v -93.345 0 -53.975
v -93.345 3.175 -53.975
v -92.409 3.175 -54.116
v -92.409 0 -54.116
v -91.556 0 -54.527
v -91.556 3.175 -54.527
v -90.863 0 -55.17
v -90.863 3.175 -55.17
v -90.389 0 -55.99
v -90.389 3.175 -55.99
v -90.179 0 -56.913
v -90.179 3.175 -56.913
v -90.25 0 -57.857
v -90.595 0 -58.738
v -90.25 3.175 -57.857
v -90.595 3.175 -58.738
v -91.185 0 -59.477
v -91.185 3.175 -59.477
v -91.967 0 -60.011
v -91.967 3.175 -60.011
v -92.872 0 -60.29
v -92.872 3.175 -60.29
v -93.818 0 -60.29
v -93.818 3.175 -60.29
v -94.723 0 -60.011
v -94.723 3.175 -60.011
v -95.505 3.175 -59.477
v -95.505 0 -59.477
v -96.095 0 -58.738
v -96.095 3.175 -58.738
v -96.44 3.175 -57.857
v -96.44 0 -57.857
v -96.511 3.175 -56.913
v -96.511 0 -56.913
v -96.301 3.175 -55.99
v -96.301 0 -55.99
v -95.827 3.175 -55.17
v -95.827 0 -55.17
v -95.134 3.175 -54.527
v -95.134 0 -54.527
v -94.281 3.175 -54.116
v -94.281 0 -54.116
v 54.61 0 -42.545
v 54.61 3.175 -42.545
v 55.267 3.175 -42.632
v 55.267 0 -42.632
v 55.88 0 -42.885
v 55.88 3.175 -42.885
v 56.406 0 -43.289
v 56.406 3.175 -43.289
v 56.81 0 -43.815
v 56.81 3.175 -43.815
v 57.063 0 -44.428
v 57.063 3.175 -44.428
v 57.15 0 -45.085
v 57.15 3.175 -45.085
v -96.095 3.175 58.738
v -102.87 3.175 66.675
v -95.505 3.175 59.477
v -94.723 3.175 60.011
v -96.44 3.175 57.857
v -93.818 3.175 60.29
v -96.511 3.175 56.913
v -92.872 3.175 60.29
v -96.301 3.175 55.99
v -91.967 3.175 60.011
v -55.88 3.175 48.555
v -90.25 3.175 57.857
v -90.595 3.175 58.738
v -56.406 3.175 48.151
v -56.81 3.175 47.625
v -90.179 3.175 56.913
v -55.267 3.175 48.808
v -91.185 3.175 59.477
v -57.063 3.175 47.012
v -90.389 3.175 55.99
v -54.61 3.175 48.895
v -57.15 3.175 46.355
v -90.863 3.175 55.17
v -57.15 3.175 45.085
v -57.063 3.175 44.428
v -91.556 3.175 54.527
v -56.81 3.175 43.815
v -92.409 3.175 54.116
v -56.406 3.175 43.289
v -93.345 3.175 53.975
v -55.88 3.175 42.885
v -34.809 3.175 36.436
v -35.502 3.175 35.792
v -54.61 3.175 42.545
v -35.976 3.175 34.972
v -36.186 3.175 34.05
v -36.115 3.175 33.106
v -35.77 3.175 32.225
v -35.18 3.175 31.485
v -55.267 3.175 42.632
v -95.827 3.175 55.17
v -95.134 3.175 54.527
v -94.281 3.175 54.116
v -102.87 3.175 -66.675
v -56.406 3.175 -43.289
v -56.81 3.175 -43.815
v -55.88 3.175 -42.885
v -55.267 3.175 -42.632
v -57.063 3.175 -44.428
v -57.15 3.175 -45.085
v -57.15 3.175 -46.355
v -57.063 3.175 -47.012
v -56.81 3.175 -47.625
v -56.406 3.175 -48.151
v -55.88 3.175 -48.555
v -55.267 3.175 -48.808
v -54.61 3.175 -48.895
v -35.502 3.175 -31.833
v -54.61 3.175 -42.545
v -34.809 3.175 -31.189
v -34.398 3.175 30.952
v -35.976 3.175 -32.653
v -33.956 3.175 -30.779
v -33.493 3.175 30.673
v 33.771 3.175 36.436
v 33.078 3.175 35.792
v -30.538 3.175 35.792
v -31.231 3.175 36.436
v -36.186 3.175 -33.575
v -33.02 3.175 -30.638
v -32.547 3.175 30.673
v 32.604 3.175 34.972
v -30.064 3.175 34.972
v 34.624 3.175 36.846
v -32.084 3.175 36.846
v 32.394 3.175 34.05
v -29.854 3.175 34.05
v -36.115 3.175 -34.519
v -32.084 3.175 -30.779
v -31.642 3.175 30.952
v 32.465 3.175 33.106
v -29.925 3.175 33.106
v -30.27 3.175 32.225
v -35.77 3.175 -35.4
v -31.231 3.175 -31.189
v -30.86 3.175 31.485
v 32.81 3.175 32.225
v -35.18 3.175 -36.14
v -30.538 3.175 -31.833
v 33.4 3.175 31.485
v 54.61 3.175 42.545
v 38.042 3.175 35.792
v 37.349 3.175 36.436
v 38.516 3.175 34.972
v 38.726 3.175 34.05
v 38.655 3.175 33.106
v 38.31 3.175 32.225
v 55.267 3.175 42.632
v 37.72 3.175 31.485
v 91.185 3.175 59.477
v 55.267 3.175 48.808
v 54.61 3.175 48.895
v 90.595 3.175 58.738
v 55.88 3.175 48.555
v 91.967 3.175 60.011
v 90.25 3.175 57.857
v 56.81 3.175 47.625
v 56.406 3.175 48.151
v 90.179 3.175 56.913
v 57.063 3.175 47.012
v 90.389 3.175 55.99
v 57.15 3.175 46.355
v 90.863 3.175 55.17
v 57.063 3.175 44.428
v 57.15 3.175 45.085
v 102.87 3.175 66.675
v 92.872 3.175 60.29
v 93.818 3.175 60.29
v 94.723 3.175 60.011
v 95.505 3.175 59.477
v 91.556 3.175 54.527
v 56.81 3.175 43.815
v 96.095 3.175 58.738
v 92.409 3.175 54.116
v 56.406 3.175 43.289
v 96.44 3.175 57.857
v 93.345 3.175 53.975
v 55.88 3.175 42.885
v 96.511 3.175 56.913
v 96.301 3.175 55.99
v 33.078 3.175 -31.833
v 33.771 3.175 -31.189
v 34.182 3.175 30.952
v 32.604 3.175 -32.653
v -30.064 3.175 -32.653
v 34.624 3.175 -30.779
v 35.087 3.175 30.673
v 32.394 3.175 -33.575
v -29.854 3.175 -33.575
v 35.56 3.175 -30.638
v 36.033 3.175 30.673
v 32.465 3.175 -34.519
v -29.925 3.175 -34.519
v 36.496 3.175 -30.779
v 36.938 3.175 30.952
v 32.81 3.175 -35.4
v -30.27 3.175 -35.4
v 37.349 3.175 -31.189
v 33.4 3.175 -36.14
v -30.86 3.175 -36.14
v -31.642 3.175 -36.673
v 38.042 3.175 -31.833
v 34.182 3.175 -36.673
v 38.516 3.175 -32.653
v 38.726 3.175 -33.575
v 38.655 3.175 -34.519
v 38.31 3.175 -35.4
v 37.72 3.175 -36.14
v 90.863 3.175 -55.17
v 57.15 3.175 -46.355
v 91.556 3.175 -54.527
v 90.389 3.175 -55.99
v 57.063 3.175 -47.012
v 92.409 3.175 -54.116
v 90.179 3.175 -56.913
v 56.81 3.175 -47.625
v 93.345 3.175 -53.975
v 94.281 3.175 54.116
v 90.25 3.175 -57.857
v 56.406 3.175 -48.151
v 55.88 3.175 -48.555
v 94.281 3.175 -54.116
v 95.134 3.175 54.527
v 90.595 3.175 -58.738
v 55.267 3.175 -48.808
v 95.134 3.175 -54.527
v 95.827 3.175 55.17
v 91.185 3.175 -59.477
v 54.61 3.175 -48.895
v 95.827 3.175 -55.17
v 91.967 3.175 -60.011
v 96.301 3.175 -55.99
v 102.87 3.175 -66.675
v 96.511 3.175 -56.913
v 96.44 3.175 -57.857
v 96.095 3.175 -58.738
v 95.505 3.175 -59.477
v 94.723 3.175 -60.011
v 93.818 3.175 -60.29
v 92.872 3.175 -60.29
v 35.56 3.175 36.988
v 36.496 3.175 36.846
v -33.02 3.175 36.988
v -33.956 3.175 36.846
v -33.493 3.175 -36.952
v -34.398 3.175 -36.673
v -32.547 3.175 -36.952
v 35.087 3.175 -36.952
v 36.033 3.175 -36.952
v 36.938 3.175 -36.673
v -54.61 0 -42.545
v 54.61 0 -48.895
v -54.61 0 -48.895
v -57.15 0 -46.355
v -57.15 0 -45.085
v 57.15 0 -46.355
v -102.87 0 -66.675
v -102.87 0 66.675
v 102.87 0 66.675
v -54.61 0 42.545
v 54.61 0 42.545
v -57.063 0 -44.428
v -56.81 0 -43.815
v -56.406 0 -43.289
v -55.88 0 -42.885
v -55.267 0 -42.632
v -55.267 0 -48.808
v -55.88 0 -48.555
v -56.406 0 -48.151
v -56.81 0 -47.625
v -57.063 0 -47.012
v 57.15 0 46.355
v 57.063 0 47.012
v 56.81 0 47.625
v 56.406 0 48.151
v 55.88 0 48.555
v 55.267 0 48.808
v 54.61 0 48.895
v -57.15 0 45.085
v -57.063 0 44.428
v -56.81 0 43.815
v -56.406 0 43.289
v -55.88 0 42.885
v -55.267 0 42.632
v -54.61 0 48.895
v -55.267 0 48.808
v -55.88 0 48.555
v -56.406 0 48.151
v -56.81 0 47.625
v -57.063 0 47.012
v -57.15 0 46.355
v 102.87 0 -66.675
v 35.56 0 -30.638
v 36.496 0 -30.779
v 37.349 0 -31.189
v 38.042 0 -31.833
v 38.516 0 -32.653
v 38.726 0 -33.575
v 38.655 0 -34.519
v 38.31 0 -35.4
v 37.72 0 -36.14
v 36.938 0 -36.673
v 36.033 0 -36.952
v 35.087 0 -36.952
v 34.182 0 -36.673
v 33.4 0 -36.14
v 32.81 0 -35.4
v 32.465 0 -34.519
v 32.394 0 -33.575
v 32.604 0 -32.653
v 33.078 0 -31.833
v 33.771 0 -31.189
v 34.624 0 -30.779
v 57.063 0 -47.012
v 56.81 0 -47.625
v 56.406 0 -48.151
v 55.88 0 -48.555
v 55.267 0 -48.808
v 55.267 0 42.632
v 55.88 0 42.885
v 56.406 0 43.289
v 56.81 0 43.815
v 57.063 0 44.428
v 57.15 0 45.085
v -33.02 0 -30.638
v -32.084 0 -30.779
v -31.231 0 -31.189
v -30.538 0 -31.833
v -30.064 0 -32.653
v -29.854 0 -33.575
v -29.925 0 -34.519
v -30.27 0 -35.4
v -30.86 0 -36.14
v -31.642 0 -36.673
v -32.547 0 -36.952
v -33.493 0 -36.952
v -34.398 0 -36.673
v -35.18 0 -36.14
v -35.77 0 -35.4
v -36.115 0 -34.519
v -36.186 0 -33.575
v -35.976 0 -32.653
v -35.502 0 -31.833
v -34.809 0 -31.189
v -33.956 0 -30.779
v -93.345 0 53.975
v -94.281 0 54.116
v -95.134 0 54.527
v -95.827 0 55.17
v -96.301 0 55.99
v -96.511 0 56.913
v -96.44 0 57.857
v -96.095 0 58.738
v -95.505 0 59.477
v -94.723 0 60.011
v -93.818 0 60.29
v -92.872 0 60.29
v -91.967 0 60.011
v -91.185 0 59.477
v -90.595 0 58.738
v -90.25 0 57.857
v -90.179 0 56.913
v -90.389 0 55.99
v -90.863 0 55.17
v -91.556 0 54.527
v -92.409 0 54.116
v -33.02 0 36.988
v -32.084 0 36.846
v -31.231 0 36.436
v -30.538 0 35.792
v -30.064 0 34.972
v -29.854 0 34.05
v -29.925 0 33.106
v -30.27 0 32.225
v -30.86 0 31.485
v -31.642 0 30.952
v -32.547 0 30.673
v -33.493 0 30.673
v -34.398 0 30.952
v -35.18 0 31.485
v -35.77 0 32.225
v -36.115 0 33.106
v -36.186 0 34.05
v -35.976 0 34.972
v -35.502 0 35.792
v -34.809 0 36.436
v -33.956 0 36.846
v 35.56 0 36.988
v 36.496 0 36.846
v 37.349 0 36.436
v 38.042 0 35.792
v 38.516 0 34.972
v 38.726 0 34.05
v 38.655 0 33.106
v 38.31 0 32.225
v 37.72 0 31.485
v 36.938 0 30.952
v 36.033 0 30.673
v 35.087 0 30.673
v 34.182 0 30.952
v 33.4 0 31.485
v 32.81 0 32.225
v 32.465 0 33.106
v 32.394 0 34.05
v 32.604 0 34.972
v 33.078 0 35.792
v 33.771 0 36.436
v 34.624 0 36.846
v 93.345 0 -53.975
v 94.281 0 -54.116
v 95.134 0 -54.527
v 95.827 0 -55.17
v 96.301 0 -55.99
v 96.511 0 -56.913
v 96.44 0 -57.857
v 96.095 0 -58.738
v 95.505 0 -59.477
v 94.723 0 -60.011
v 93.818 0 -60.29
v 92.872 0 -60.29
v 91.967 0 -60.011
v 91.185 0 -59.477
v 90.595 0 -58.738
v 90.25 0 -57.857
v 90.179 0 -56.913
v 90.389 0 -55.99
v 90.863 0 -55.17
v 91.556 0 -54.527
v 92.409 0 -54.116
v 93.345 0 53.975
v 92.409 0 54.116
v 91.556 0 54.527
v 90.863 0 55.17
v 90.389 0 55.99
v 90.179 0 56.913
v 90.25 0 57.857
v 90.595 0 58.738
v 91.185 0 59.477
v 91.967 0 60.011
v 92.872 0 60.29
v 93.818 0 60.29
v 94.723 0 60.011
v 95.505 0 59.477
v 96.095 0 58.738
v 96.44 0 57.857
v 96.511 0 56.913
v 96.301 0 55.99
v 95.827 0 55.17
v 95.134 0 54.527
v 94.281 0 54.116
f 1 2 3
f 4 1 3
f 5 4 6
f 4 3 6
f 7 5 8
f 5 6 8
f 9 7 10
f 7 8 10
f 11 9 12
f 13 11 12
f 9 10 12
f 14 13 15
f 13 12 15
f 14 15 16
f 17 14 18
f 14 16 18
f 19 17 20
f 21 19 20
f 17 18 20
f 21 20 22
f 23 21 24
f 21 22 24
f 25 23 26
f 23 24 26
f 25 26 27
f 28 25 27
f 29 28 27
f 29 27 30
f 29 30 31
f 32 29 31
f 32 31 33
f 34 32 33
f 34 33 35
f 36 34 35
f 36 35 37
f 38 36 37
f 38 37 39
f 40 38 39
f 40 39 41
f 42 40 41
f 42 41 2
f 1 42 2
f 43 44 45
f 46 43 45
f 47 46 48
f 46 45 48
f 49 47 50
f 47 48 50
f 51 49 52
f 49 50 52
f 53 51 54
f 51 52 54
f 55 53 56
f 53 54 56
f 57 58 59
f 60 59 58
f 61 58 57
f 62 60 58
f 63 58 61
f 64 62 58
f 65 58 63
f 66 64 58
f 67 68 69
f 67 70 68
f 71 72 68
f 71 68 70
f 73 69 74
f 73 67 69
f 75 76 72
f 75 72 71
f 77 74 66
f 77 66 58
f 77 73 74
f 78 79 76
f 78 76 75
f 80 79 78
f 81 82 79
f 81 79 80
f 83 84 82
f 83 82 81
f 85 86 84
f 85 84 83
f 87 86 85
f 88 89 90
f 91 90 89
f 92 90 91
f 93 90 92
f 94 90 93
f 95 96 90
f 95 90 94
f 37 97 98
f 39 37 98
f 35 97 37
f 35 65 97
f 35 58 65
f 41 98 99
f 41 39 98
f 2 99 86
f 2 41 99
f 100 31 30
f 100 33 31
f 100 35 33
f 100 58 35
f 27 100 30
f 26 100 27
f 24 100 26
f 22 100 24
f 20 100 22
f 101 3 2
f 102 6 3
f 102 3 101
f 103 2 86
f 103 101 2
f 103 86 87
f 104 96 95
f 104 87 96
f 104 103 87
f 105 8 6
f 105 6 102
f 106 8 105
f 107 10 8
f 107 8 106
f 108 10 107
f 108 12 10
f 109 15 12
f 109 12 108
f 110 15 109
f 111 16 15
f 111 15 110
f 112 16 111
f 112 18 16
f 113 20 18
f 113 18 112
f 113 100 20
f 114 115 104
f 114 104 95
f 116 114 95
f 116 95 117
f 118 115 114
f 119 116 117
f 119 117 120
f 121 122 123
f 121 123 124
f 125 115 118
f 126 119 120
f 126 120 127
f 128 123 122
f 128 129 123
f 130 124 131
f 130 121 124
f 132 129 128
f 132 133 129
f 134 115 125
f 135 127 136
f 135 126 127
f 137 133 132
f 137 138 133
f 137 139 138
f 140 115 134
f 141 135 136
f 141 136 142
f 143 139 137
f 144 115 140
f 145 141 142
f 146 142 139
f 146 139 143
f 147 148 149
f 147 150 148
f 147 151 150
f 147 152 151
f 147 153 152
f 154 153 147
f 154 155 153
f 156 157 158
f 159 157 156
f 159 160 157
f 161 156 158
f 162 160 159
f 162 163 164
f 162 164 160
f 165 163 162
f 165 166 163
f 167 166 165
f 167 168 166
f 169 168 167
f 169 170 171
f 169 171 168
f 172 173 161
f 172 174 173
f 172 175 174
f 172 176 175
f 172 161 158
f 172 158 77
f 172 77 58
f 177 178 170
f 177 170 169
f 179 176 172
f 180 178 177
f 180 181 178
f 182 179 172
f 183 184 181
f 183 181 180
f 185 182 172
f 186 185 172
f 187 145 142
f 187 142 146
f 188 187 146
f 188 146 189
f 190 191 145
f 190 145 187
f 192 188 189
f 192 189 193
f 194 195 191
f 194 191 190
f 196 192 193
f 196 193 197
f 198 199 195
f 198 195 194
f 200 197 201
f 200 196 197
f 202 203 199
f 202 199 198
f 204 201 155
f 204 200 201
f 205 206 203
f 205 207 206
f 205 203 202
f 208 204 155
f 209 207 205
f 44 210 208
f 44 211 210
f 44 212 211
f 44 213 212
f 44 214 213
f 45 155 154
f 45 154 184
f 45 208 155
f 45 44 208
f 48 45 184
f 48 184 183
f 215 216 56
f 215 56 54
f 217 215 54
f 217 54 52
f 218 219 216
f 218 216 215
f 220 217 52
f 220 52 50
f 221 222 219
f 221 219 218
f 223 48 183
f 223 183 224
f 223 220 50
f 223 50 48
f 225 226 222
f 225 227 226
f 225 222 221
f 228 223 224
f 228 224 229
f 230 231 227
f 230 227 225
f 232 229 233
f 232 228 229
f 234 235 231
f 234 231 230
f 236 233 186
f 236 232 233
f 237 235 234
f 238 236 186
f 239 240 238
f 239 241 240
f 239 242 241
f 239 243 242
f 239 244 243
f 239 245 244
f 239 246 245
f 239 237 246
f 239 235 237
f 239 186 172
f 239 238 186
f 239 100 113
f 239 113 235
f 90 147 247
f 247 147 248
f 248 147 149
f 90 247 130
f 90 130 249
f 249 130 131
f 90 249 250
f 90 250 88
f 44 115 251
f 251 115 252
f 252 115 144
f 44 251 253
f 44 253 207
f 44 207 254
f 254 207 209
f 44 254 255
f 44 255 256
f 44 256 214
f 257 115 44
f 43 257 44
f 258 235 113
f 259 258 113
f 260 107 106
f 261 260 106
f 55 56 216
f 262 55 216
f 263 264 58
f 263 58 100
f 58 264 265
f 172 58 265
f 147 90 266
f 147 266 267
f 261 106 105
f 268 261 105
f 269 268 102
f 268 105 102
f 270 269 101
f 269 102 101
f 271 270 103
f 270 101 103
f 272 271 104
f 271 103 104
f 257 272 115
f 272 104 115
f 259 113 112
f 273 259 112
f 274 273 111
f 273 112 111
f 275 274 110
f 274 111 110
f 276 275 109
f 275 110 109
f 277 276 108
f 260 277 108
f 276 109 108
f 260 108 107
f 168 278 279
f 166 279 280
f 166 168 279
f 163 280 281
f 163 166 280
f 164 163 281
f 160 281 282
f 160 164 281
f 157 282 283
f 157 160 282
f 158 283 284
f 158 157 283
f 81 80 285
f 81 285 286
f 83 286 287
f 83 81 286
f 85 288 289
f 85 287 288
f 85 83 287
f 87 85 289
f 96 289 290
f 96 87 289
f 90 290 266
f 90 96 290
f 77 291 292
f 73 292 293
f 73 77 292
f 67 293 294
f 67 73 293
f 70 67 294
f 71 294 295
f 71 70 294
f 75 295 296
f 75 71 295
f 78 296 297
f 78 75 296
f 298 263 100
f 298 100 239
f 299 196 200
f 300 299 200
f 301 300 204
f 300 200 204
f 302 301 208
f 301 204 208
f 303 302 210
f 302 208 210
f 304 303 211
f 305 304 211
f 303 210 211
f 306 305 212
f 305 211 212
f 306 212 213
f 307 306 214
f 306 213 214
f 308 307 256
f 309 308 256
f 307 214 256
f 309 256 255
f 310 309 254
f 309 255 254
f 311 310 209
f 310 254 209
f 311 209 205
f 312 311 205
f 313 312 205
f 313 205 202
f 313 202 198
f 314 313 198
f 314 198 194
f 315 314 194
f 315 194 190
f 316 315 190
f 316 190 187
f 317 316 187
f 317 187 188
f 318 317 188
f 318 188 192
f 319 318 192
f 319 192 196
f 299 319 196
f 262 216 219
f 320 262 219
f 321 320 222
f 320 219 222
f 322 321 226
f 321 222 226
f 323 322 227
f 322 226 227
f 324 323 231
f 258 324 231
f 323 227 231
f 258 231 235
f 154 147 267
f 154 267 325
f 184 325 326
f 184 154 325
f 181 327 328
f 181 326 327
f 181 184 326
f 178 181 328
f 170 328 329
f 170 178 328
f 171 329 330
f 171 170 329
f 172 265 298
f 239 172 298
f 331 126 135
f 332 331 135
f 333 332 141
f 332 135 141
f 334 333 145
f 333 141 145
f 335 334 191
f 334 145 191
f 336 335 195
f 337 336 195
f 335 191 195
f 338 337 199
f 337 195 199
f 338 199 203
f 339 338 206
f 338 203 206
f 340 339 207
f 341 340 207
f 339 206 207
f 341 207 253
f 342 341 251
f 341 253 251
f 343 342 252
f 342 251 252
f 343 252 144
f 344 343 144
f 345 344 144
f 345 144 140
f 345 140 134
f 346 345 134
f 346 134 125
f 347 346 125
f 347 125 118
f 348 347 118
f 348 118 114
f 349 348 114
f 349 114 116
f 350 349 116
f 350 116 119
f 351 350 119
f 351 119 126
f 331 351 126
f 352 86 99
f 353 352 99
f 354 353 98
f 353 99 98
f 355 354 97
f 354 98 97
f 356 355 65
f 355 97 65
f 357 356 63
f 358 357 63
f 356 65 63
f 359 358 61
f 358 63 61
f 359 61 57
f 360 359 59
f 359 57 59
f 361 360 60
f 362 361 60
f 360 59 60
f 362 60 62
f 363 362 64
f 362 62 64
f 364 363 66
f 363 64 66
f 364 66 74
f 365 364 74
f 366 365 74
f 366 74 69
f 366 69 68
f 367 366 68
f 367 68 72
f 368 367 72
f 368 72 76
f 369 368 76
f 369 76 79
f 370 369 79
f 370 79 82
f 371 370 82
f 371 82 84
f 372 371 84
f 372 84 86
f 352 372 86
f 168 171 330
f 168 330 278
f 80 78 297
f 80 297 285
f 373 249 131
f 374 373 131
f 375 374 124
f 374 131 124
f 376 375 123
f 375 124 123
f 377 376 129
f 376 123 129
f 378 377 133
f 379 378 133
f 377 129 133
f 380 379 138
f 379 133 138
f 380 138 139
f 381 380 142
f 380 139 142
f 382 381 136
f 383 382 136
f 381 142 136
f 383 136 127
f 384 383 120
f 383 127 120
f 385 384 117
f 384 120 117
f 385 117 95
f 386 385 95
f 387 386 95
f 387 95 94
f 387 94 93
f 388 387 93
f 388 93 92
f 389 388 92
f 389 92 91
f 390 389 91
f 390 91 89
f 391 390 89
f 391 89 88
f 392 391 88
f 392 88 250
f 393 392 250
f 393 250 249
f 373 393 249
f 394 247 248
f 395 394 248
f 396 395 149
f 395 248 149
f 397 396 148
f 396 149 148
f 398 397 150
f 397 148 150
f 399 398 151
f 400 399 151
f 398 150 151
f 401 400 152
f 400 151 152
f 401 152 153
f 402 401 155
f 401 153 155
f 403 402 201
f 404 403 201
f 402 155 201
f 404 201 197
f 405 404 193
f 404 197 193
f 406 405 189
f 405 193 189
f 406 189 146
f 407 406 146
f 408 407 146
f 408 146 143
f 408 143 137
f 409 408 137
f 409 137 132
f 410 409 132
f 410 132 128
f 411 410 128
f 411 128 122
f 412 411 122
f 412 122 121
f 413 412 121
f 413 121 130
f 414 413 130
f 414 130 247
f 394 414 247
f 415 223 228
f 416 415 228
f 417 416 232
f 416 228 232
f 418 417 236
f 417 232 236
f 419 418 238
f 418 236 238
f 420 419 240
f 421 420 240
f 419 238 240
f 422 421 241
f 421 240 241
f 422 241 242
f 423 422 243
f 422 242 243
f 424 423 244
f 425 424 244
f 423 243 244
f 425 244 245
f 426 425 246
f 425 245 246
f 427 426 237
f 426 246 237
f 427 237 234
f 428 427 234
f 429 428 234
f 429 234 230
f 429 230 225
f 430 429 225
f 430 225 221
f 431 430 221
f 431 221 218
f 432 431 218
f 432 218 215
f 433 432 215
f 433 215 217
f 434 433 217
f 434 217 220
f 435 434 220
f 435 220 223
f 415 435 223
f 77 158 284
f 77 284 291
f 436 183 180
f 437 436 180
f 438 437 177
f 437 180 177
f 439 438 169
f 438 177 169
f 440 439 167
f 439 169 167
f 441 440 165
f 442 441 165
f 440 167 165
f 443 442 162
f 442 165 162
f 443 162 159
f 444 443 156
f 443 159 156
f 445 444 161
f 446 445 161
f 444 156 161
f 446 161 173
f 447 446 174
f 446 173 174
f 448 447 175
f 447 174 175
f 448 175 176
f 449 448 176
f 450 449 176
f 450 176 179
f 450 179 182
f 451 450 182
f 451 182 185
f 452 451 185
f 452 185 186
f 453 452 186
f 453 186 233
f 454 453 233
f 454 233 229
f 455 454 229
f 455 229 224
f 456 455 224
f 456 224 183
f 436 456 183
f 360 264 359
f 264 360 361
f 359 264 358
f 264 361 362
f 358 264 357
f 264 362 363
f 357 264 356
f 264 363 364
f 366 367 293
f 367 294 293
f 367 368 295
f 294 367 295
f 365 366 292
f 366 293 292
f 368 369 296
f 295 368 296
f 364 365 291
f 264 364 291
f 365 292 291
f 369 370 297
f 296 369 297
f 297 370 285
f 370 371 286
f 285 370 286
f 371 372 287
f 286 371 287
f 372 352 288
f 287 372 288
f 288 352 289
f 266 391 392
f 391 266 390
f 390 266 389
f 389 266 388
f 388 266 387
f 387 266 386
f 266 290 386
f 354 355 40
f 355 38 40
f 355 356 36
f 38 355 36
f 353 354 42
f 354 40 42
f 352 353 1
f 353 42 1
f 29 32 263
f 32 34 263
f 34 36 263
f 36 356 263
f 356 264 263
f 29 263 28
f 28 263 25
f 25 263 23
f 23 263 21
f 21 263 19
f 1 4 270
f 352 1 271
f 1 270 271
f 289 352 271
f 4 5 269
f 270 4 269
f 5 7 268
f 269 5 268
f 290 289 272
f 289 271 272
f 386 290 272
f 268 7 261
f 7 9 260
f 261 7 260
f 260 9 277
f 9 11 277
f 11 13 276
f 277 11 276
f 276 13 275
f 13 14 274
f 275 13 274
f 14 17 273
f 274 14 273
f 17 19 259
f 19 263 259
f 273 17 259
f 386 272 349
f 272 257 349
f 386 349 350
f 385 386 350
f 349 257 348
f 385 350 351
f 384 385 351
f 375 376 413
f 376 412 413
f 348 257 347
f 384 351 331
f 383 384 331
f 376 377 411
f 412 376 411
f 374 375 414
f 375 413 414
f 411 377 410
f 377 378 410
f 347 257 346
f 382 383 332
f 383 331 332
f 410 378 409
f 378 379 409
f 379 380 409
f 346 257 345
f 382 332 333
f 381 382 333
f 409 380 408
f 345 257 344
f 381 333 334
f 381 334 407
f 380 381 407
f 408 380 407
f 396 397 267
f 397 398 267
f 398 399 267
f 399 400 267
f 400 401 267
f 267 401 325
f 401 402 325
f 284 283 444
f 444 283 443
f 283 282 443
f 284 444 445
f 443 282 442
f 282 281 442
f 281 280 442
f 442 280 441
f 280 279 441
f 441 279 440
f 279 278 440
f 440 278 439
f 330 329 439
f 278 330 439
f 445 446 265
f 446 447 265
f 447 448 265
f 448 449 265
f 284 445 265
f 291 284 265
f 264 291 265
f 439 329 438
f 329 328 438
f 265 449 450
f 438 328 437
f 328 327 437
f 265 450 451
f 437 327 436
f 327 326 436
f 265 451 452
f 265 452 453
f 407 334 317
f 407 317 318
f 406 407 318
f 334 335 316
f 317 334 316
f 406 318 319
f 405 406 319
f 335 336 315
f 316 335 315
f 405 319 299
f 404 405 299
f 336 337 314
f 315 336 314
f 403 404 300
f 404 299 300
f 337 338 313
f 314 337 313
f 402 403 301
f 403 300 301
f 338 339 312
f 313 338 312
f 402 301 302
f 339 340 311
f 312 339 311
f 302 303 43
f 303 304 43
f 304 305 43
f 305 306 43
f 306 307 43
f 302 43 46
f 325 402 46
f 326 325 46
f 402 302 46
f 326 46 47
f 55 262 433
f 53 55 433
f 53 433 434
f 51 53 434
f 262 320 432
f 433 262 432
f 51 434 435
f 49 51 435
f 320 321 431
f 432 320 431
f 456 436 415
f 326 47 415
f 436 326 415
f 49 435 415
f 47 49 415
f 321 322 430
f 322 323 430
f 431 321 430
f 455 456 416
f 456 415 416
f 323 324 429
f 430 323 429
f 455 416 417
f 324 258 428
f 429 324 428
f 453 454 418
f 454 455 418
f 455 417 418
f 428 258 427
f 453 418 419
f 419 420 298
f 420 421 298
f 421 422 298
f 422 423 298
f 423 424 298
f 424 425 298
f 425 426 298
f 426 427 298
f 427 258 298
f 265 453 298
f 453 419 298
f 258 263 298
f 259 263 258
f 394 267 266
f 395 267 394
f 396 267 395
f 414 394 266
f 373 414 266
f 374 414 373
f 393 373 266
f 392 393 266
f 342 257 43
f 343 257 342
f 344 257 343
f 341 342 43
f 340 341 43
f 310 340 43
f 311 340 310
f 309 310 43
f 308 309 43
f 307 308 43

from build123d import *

# Parameters (mm, degrees)
SKETCH1_W           = 205.74
SKETCH1_H           = 133.35
BOSS_EXTRUDE1_DEPTH = 3.175
SKETCH3_R           = 3.175
CUT_EXTRUDE3_DEPTH  = 123.629006153
SKETCH4_R           = 3.175
CUT_EXTRUDE4_DEPTH  = 123.629006153
CUT_EXTRUDE5_DEPTH  = 123.629006153


with BuildPart() as part:
    # Sketch1 → Boss-Extrude1 (new body)
    with BuildSketch(Plane(origin=(0, 0, 0), x_dir=(1, 0, 0), z_dir=(0, 1, 0))):
        Rectangle(SKETCH1_W, SKETCH1_H)
    extrude(amount=BOSS_EXTRUDE1_DEPTH)

    # Sketch3 → Cut-Extrude3 (cut, through all)
    with BuildSketch(Plane(origin=(0, 3.175, 0), x_dir=(1, 0, 0), z_dir=(0, 1, 0))):
        with Locations(Location((35.56, 33.812500066, 0), (0, 0, 270))):
            Circle(SKETCH3_R)
        with Locations(Location((35.56, -33.812500066, 0), (0, 0, 270))):
            Circle(SKETCH3_R)
        with Locations(Location((-33.02, -33.812500066, 0), (0, 0, 270))):
            Circle(SKETCH3_R)
        with Locations(Location((-33.02, 33.812500066, 0), (0, 0, 270))):
            Circle(SKETCH3_R)
    extrude(amount=-CUT_EXTRUDE3_DEPTH, mode=Mode.SUBTRACT)

    # Sketch4 → Cut-Extrude4 (cut, through all)
    with BuildSketch(Plane(origin=(0, 3.175, 0), x_dir=(1, 0, 0), z_dir=(0, 1, 0))):
        with Locations(Location((-93.345, 57.15, 0), (0, 0, 270))):
            Circle(SKETCH4_R)
        with Locations(Location((93.345, 57.15, 0), (0, 0, 270))):
            Circle(SKETCH4_R)
        with Locations(Location((93.345, -57.15, 0), (0, 0, 90))):
            Circle(SKETCH4_R)
        with Locations(Location((-93.345, -57.15, 0), (0, 0, 90))):
            Circle(SKETCH4_R)
    extrude(amount=-CUT_EXTRUDE4_DEPTH, mode=Mode.SUBTRACT)

    # Sketch5 → Cut-Extrude5 (cut, through all)
    with BuildSketch(Plane(origin=(0, 3.175, 0), x_dir=(1, 0, 0), z_dir=(0, 1, 0))):
        with BuildLine():
            Line((-54.61, -42.545), (54.61, -42.545))
            ThreePointArc((54.61, -42.545), (56.406051224, -43.288948776), (57.15, -45.085))
            Line((57.15, -45.085), (57.15, -46.355))
            ThreePointArc((57.15, -46.355), (56.406051224, -48.151051224), (54.61, -48.895))
            Line((54.61, -48.895), (-54.61, -48.895))
            ThreePointArc((-54.61, -48.895), (-56.406051224, -48.151051224), (-57.15, -46.355))
            Line((-57.15, -46.355), (-57.15, -45.085))
            ThreePointArc((-57.15, -45.085), (-56.406051224, -43.288948776), (-54.61, -42.545))
        make_face()
        with BuildLine():
            Line((57.15, 45.085), (57.15, 46.355))
            ThreePointArc((57.15, 46.355), (56.406051224, 48.151051224), (54.61, 48.895))
            Line((54.61, 48.895), (-54.61, 48.895))
            ThreePointArc((-54.61, 48.895), (-56.406051224, 48.151051224), (-57.15, 46.355))
            Line((-57.15, 46.355), (-57.15, 45.085))
            ThreePointArc((-57.15, 45.085), (-56.406051224, 43.288948776), (-54.61, 42.545))
            Line((-54.61, 42.545), (54.61, 42.545))
            ThreePointArc((54.61, 42.545), (56.406051224, 43.288948776), (57.15, 45.085))
        make_face()
    extrude(amount=-CUT_EXTRUDE5_DEPTH, mode=Mode.SUBTRACT)


solid = part.part
